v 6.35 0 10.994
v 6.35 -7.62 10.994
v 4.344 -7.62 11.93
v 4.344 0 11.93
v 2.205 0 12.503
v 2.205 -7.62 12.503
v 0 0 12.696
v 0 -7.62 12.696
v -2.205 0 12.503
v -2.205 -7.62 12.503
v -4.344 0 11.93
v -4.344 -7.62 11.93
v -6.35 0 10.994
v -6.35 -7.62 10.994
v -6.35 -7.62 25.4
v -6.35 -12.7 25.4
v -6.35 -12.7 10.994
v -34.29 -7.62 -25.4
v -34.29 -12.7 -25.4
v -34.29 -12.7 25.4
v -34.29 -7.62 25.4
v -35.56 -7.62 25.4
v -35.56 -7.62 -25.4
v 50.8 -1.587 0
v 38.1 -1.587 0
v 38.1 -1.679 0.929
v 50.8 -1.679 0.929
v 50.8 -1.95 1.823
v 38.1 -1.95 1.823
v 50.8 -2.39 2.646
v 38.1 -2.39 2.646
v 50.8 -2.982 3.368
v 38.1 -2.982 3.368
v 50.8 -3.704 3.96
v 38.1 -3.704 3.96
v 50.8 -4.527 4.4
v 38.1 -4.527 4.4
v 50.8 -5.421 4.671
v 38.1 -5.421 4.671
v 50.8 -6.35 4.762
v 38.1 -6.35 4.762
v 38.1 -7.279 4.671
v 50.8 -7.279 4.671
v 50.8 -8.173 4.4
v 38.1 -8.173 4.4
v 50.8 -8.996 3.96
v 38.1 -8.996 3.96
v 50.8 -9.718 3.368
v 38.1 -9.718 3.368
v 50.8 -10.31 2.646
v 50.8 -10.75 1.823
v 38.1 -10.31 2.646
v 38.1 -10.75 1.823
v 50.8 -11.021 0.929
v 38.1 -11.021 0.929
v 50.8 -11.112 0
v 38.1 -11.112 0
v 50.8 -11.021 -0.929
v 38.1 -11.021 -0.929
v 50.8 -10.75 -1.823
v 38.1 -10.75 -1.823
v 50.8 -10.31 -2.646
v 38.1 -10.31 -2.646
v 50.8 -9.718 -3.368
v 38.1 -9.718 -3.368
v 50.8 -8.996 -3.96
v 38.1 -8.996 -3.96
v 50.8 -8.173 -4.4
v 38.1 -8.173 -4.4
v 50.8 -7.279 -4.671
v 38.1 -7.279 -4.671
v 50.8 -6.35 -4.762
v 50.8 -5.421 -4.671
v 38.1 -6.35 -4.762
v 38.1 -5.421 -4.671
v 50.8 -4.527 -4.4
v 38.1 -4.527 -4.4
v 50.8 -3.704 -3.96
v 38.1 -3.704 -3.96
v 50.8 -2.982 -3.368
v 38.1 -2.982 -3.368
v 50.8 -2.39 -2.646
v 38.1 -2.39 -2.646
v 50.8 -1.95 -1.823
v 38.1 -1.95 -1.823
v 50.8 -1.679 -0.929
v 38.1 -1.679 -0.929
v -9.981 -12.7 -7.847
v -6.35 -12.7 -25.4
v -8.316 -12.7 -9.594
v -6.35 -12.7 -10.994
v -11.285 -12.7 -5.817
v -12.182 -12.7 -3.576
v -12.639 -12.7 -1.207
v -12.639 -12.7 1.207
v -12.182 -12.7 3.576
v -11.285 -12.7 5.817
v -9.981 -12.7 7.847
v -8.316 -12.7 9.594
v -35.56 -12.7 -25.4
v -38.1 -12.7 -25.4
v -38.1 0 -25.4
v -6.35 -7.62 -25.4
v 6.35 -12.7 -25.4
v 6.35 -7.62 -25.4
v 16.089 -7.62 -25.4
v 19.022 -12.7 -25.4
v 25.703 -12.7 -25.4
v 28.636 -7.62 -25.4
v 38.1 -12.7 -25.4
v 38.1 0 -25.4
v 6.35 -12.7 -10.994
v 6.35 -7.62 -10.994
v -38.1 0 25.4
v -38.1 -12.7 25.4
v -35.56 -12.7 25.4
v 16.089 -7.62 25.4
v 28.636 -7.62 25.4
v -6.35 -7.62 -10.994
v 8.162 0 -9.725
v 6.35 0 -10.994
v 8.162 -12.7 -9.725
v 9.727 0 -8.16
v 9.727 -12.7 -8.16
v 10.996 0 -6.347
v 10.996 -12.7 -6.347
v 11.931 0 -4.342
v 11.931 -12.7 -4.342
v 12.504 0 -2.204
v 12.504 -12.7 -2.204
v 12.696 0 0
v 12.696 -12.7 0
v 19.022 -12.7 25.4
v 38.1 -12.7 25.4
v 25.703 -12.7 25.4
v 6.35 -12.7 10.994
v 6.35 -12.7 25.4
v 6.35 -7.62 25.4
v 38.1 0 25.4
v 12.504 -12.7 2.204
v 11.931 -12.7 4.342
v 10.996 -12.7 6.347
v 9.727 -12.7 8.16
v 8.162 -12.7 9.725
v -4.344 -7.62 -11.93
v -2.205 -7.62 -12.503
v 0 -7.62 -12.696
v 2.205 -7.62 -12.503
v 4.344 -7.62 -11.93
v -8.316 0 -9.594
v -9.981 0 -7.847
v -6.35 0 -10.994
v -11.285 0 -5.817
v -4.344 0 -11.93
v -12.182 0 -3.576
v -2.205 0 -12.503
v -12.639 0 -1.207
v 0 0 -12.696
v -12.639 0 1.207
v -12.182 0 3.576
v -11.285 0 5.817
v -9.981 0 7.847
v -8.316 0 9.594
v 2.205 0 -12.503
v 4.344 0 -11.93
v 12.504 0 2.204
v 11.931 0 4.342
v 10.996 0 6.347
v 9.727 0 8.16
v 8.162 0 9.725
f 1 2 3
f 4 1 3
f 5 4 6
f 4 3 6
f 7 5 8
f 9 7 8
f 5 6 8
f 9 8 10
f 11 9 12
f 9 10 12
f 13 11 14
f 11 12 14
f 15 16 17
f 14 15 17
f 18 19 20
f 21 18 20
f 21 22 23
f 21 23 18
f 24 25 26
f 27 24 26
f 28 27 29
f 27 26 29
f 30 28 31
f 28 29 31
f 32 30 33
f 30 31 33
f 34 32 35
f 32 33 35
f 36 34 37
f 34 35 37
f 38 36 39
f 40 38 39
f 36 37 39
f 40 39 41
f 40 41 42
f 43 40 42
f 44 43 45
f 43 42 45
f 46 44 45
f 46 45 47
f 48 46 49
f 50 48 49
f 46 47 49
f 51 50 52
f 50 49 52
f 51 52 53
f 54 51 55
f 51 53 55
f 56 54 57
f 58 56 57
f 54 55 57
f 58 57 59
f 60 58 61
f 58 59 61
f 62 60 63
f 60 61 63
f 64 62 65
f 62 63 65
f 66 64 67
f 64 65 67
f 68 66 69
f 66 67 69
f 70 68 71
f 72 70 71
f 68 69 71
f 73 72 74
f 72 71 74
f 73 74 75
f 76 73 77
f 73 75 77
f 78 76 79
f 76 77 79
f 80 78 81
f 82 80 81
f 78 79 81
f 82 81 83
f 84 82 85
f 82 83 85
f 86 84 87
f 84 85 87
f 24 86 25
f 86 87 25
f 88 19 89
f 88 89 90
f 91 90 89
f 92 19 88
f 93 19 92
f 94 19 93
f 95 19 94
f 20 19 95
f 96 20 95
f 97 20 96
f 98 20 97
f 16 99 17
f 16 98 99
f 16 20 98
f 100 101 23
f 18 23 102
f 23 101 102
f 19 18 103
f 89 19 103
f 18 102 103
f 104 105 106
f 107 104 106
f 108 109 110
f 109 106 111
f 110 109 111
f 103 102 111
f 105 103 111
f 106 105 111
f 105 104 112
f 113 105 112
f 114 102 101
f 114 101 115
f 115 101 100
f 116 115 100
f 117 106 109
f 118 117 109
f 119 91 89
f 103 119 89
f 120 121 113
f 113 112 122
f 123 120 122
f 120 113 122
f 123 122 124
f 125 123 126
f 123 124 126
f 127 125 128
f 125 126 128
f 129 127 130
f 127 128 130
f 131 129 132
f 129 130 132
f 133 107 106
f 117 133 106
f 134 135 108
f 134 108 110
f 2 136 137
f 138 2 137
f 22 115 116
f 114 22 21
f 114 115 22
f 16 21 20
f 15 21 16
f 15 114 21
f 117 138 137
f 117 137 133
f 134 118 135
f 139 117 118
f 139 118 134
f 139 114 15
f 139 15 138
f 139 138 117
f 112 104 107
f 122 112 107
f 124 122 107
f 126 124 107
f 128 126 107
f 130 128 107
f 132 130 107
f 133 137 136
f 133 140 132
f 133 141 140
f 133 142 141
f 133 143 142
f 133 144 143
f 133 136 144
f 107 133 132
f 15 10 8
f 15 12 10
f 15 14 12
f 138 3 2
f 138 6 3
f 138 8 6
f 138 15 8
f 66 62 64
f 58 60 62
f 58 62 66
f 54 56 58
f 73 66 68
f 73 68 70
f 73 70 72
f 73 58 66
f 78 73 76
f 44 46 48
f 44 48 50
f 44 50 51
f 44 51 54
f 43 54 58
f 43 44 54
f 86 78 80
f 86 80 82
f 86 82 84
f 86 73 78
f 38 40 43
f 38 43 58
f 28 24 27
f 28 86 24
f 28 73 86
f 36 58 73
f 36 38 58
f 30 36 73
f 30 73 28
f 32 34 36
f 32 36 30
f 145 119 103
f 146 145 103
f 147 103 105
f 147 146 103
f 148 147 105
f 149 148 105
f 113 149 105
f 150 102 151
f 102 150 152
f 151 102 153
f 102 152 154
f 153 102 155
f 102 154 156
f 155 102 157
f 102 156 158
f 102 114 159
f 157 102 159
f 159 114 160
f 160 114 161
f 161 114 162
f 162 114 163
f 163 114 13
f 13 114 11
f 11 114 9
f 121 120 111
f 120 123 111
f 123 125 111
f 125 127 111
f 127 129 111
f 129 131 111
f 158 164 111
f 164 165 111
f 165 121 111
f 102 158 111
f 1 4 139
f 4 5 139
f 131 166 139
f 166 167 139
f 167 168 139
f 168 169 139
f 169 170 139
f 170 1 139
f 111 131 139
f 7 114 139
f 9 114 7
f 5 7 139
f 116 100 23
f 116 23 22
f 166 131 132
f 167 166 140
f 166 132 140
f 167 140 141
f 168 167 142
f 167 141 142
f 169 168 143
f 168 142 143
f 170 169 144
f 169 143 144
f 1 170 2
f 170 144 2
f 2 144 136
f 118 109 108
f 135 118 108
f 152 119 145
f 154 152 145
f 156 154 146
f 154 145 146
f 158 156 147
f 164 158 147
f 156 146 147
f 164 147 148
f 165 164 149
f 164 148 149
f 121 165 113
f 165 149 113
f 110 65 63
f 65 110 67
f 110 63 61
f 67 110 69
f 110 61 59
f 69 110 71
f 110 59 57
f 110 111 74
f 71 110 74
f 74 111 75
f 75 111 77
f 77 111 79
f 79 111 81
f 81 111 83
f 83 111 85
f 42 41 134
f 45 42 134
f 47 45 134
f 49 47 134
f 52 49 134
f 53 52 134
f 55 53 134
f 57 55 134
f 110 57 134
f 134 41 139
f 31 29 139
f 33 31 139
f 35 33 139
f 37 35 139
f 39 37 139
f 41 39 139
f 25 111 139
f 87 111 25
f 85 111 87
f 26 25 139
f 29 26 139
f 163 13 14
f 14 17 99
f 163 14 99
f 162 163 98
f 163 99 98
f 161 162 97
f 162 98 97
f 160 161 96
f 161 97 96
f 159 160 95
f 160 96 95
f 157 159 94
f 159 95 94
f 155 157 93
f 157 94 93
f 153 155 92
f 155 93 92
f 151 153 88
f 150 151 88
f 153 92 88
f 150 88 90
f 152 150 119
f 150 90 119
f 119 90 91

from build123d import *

# Parameters (mm, degrees)
F0_W     = 76.2
F0_H     = 50.8
F1_DEPTH = 12.7
F3_DEPTH = 12.7
F2_W     = 1.27
F2_H     = 50.8
F4_DEPTH = 5.08
F6_DEPTH = 50.8
F7_R     = 4.7625
F8_DEPTH = 12.7


with BuildPart() as f1:
    # F0 (on Front) → F1 (new body)
    with BuildSketch(Plane.XZ):
        Rectangle(F0_W, F0_H)
    extrude(amount=F1_DEPTH)

    # F2 (on face) → F3 (cut)
    with BuildSketch(Plane.XZ.offset(12.7)):
        with BuildLine():
            Line((-6.35, -10.994409386), (-6.35, 10.994409386))
            ThreePointArc((-6.35, 10.994409386), (-12.6964379944, 0), (-6.35, -10.994409386))
        make_face()
        with BuildLine():
            ThreePointArc((6.35, 10.994409386), (0, 12.6964379944), (-6.35, 10.994409386))
            Line((-6.35, 10.994409386), (-6.35, -10.994409386))
            ThreePointArc((-6.35, -10.994409386), (0, -12.6964379944), (6.35, -10.994409386))
            Line((6.35, -10.994409386), (6.35, 10.994409386))
        make_face()
        with BuildLine():
            ThreePointArc((12.6964379944, 0), (10.99595196, 6.3473284334), (6.35, 10.994409386))
            Line((6.35, 10.994409386), (6.35, -10.994409386))
            ThreePointArc((6.35, -10.994409386), (10.99595196, -6.3473284334), (12.6964379944, 0))
        make_face()
    extrude(amount=-F3_DEPTH, mode=Mode.SUBTRACT)

    # F2 (on face) → F4 (cut)
    with BuildSketch(Plane.XZ.offset(12.7)):
        with Locations((-34.925, 0)):
            Rectangle(F2_W, F2_H)
        with BuildLine():
            ThreePointArc((6.35, -10.994409386), (10.99595196, -6.3473284334), (12.6964379944, 0))
            ThreePointArc((12.6964379944, 0), (10.99595196, 6.3473284334), (6.35, 10.994409386))
            Line((6.35, 10.994409386), (6.35, -10.994409386))
        make_face()
        with BuildLine():
            Line((6.35, -10.994409386), (6.35, 10.994409386))
            ThreePointArc((6.35, 10.994409386), (0, 12.6964379944), (-6.35, 10.994409386))
            Line((-6.35, 10.994409386), (-6.35, -10.994409386))
            ThreePointArc((-6.35, -10.994409386), (0, -12.6964379944), (6.35, -10.994409386))
        make_face()
        with BuildLine():
            ThreePointArc((-6.35, 10.994409386), (0, 12.6964379944), (6.35, 10.994409386))
            Line((6.35, 10.994409386), (6.35, 25.4))
            Line((6.35, 25.4), (-6.35, 25.4))
            Line((-6.35, 25.4), (-6.35, 10.994409386))
        make_face()
        with BuildLine():
            Line((6.35, -25.4), (6.35, -10.994409386))
            ThreePointArc((6.35, -10.994409386), (0, -12.6964379944), (-6.35, -10.994409386))
            Line((-6.35, -10.994409386), (-6.35, -25.4))
            Line((-6.35, -25.4), (6.35, -25.4))
        make_face()
        with BuildLine():
            Line((-6.35, -10.994409386), (-6.35, 10.994409386))
            ThreePointArc((-6.35, 10.994409386), (-12.6964379944, 0), (-6.35, -10.994409386))
        make_face()
    extrude(amount=-F4_DEPTH, mode=Mode.SUBTRACT)

    # F5 (on face) → F6 (cut)
    with BuildSketch(Plane(origin=(0, 0, -25.4), x_dir=(1, 0, 0), z_dir=(0, 0, -1))):
        Polygon((25.7032178342, 12.7), (19.0220633893, 12.7), (16.0891240218, 7.62), (28.6361572017, 7.62), align=None)
    extrude(amount=-F6_DEPTH, mode=Mode.SUBTRACT)

    # F7 (on face) → F8 (join)
    with BuildSketch(Plane.YZ.offset(38.1)):
        with Locations((-6.35, 0)):
            Circle(F7_R)
    extrude(amount=F8_DEPTH)


solid = f1.part
